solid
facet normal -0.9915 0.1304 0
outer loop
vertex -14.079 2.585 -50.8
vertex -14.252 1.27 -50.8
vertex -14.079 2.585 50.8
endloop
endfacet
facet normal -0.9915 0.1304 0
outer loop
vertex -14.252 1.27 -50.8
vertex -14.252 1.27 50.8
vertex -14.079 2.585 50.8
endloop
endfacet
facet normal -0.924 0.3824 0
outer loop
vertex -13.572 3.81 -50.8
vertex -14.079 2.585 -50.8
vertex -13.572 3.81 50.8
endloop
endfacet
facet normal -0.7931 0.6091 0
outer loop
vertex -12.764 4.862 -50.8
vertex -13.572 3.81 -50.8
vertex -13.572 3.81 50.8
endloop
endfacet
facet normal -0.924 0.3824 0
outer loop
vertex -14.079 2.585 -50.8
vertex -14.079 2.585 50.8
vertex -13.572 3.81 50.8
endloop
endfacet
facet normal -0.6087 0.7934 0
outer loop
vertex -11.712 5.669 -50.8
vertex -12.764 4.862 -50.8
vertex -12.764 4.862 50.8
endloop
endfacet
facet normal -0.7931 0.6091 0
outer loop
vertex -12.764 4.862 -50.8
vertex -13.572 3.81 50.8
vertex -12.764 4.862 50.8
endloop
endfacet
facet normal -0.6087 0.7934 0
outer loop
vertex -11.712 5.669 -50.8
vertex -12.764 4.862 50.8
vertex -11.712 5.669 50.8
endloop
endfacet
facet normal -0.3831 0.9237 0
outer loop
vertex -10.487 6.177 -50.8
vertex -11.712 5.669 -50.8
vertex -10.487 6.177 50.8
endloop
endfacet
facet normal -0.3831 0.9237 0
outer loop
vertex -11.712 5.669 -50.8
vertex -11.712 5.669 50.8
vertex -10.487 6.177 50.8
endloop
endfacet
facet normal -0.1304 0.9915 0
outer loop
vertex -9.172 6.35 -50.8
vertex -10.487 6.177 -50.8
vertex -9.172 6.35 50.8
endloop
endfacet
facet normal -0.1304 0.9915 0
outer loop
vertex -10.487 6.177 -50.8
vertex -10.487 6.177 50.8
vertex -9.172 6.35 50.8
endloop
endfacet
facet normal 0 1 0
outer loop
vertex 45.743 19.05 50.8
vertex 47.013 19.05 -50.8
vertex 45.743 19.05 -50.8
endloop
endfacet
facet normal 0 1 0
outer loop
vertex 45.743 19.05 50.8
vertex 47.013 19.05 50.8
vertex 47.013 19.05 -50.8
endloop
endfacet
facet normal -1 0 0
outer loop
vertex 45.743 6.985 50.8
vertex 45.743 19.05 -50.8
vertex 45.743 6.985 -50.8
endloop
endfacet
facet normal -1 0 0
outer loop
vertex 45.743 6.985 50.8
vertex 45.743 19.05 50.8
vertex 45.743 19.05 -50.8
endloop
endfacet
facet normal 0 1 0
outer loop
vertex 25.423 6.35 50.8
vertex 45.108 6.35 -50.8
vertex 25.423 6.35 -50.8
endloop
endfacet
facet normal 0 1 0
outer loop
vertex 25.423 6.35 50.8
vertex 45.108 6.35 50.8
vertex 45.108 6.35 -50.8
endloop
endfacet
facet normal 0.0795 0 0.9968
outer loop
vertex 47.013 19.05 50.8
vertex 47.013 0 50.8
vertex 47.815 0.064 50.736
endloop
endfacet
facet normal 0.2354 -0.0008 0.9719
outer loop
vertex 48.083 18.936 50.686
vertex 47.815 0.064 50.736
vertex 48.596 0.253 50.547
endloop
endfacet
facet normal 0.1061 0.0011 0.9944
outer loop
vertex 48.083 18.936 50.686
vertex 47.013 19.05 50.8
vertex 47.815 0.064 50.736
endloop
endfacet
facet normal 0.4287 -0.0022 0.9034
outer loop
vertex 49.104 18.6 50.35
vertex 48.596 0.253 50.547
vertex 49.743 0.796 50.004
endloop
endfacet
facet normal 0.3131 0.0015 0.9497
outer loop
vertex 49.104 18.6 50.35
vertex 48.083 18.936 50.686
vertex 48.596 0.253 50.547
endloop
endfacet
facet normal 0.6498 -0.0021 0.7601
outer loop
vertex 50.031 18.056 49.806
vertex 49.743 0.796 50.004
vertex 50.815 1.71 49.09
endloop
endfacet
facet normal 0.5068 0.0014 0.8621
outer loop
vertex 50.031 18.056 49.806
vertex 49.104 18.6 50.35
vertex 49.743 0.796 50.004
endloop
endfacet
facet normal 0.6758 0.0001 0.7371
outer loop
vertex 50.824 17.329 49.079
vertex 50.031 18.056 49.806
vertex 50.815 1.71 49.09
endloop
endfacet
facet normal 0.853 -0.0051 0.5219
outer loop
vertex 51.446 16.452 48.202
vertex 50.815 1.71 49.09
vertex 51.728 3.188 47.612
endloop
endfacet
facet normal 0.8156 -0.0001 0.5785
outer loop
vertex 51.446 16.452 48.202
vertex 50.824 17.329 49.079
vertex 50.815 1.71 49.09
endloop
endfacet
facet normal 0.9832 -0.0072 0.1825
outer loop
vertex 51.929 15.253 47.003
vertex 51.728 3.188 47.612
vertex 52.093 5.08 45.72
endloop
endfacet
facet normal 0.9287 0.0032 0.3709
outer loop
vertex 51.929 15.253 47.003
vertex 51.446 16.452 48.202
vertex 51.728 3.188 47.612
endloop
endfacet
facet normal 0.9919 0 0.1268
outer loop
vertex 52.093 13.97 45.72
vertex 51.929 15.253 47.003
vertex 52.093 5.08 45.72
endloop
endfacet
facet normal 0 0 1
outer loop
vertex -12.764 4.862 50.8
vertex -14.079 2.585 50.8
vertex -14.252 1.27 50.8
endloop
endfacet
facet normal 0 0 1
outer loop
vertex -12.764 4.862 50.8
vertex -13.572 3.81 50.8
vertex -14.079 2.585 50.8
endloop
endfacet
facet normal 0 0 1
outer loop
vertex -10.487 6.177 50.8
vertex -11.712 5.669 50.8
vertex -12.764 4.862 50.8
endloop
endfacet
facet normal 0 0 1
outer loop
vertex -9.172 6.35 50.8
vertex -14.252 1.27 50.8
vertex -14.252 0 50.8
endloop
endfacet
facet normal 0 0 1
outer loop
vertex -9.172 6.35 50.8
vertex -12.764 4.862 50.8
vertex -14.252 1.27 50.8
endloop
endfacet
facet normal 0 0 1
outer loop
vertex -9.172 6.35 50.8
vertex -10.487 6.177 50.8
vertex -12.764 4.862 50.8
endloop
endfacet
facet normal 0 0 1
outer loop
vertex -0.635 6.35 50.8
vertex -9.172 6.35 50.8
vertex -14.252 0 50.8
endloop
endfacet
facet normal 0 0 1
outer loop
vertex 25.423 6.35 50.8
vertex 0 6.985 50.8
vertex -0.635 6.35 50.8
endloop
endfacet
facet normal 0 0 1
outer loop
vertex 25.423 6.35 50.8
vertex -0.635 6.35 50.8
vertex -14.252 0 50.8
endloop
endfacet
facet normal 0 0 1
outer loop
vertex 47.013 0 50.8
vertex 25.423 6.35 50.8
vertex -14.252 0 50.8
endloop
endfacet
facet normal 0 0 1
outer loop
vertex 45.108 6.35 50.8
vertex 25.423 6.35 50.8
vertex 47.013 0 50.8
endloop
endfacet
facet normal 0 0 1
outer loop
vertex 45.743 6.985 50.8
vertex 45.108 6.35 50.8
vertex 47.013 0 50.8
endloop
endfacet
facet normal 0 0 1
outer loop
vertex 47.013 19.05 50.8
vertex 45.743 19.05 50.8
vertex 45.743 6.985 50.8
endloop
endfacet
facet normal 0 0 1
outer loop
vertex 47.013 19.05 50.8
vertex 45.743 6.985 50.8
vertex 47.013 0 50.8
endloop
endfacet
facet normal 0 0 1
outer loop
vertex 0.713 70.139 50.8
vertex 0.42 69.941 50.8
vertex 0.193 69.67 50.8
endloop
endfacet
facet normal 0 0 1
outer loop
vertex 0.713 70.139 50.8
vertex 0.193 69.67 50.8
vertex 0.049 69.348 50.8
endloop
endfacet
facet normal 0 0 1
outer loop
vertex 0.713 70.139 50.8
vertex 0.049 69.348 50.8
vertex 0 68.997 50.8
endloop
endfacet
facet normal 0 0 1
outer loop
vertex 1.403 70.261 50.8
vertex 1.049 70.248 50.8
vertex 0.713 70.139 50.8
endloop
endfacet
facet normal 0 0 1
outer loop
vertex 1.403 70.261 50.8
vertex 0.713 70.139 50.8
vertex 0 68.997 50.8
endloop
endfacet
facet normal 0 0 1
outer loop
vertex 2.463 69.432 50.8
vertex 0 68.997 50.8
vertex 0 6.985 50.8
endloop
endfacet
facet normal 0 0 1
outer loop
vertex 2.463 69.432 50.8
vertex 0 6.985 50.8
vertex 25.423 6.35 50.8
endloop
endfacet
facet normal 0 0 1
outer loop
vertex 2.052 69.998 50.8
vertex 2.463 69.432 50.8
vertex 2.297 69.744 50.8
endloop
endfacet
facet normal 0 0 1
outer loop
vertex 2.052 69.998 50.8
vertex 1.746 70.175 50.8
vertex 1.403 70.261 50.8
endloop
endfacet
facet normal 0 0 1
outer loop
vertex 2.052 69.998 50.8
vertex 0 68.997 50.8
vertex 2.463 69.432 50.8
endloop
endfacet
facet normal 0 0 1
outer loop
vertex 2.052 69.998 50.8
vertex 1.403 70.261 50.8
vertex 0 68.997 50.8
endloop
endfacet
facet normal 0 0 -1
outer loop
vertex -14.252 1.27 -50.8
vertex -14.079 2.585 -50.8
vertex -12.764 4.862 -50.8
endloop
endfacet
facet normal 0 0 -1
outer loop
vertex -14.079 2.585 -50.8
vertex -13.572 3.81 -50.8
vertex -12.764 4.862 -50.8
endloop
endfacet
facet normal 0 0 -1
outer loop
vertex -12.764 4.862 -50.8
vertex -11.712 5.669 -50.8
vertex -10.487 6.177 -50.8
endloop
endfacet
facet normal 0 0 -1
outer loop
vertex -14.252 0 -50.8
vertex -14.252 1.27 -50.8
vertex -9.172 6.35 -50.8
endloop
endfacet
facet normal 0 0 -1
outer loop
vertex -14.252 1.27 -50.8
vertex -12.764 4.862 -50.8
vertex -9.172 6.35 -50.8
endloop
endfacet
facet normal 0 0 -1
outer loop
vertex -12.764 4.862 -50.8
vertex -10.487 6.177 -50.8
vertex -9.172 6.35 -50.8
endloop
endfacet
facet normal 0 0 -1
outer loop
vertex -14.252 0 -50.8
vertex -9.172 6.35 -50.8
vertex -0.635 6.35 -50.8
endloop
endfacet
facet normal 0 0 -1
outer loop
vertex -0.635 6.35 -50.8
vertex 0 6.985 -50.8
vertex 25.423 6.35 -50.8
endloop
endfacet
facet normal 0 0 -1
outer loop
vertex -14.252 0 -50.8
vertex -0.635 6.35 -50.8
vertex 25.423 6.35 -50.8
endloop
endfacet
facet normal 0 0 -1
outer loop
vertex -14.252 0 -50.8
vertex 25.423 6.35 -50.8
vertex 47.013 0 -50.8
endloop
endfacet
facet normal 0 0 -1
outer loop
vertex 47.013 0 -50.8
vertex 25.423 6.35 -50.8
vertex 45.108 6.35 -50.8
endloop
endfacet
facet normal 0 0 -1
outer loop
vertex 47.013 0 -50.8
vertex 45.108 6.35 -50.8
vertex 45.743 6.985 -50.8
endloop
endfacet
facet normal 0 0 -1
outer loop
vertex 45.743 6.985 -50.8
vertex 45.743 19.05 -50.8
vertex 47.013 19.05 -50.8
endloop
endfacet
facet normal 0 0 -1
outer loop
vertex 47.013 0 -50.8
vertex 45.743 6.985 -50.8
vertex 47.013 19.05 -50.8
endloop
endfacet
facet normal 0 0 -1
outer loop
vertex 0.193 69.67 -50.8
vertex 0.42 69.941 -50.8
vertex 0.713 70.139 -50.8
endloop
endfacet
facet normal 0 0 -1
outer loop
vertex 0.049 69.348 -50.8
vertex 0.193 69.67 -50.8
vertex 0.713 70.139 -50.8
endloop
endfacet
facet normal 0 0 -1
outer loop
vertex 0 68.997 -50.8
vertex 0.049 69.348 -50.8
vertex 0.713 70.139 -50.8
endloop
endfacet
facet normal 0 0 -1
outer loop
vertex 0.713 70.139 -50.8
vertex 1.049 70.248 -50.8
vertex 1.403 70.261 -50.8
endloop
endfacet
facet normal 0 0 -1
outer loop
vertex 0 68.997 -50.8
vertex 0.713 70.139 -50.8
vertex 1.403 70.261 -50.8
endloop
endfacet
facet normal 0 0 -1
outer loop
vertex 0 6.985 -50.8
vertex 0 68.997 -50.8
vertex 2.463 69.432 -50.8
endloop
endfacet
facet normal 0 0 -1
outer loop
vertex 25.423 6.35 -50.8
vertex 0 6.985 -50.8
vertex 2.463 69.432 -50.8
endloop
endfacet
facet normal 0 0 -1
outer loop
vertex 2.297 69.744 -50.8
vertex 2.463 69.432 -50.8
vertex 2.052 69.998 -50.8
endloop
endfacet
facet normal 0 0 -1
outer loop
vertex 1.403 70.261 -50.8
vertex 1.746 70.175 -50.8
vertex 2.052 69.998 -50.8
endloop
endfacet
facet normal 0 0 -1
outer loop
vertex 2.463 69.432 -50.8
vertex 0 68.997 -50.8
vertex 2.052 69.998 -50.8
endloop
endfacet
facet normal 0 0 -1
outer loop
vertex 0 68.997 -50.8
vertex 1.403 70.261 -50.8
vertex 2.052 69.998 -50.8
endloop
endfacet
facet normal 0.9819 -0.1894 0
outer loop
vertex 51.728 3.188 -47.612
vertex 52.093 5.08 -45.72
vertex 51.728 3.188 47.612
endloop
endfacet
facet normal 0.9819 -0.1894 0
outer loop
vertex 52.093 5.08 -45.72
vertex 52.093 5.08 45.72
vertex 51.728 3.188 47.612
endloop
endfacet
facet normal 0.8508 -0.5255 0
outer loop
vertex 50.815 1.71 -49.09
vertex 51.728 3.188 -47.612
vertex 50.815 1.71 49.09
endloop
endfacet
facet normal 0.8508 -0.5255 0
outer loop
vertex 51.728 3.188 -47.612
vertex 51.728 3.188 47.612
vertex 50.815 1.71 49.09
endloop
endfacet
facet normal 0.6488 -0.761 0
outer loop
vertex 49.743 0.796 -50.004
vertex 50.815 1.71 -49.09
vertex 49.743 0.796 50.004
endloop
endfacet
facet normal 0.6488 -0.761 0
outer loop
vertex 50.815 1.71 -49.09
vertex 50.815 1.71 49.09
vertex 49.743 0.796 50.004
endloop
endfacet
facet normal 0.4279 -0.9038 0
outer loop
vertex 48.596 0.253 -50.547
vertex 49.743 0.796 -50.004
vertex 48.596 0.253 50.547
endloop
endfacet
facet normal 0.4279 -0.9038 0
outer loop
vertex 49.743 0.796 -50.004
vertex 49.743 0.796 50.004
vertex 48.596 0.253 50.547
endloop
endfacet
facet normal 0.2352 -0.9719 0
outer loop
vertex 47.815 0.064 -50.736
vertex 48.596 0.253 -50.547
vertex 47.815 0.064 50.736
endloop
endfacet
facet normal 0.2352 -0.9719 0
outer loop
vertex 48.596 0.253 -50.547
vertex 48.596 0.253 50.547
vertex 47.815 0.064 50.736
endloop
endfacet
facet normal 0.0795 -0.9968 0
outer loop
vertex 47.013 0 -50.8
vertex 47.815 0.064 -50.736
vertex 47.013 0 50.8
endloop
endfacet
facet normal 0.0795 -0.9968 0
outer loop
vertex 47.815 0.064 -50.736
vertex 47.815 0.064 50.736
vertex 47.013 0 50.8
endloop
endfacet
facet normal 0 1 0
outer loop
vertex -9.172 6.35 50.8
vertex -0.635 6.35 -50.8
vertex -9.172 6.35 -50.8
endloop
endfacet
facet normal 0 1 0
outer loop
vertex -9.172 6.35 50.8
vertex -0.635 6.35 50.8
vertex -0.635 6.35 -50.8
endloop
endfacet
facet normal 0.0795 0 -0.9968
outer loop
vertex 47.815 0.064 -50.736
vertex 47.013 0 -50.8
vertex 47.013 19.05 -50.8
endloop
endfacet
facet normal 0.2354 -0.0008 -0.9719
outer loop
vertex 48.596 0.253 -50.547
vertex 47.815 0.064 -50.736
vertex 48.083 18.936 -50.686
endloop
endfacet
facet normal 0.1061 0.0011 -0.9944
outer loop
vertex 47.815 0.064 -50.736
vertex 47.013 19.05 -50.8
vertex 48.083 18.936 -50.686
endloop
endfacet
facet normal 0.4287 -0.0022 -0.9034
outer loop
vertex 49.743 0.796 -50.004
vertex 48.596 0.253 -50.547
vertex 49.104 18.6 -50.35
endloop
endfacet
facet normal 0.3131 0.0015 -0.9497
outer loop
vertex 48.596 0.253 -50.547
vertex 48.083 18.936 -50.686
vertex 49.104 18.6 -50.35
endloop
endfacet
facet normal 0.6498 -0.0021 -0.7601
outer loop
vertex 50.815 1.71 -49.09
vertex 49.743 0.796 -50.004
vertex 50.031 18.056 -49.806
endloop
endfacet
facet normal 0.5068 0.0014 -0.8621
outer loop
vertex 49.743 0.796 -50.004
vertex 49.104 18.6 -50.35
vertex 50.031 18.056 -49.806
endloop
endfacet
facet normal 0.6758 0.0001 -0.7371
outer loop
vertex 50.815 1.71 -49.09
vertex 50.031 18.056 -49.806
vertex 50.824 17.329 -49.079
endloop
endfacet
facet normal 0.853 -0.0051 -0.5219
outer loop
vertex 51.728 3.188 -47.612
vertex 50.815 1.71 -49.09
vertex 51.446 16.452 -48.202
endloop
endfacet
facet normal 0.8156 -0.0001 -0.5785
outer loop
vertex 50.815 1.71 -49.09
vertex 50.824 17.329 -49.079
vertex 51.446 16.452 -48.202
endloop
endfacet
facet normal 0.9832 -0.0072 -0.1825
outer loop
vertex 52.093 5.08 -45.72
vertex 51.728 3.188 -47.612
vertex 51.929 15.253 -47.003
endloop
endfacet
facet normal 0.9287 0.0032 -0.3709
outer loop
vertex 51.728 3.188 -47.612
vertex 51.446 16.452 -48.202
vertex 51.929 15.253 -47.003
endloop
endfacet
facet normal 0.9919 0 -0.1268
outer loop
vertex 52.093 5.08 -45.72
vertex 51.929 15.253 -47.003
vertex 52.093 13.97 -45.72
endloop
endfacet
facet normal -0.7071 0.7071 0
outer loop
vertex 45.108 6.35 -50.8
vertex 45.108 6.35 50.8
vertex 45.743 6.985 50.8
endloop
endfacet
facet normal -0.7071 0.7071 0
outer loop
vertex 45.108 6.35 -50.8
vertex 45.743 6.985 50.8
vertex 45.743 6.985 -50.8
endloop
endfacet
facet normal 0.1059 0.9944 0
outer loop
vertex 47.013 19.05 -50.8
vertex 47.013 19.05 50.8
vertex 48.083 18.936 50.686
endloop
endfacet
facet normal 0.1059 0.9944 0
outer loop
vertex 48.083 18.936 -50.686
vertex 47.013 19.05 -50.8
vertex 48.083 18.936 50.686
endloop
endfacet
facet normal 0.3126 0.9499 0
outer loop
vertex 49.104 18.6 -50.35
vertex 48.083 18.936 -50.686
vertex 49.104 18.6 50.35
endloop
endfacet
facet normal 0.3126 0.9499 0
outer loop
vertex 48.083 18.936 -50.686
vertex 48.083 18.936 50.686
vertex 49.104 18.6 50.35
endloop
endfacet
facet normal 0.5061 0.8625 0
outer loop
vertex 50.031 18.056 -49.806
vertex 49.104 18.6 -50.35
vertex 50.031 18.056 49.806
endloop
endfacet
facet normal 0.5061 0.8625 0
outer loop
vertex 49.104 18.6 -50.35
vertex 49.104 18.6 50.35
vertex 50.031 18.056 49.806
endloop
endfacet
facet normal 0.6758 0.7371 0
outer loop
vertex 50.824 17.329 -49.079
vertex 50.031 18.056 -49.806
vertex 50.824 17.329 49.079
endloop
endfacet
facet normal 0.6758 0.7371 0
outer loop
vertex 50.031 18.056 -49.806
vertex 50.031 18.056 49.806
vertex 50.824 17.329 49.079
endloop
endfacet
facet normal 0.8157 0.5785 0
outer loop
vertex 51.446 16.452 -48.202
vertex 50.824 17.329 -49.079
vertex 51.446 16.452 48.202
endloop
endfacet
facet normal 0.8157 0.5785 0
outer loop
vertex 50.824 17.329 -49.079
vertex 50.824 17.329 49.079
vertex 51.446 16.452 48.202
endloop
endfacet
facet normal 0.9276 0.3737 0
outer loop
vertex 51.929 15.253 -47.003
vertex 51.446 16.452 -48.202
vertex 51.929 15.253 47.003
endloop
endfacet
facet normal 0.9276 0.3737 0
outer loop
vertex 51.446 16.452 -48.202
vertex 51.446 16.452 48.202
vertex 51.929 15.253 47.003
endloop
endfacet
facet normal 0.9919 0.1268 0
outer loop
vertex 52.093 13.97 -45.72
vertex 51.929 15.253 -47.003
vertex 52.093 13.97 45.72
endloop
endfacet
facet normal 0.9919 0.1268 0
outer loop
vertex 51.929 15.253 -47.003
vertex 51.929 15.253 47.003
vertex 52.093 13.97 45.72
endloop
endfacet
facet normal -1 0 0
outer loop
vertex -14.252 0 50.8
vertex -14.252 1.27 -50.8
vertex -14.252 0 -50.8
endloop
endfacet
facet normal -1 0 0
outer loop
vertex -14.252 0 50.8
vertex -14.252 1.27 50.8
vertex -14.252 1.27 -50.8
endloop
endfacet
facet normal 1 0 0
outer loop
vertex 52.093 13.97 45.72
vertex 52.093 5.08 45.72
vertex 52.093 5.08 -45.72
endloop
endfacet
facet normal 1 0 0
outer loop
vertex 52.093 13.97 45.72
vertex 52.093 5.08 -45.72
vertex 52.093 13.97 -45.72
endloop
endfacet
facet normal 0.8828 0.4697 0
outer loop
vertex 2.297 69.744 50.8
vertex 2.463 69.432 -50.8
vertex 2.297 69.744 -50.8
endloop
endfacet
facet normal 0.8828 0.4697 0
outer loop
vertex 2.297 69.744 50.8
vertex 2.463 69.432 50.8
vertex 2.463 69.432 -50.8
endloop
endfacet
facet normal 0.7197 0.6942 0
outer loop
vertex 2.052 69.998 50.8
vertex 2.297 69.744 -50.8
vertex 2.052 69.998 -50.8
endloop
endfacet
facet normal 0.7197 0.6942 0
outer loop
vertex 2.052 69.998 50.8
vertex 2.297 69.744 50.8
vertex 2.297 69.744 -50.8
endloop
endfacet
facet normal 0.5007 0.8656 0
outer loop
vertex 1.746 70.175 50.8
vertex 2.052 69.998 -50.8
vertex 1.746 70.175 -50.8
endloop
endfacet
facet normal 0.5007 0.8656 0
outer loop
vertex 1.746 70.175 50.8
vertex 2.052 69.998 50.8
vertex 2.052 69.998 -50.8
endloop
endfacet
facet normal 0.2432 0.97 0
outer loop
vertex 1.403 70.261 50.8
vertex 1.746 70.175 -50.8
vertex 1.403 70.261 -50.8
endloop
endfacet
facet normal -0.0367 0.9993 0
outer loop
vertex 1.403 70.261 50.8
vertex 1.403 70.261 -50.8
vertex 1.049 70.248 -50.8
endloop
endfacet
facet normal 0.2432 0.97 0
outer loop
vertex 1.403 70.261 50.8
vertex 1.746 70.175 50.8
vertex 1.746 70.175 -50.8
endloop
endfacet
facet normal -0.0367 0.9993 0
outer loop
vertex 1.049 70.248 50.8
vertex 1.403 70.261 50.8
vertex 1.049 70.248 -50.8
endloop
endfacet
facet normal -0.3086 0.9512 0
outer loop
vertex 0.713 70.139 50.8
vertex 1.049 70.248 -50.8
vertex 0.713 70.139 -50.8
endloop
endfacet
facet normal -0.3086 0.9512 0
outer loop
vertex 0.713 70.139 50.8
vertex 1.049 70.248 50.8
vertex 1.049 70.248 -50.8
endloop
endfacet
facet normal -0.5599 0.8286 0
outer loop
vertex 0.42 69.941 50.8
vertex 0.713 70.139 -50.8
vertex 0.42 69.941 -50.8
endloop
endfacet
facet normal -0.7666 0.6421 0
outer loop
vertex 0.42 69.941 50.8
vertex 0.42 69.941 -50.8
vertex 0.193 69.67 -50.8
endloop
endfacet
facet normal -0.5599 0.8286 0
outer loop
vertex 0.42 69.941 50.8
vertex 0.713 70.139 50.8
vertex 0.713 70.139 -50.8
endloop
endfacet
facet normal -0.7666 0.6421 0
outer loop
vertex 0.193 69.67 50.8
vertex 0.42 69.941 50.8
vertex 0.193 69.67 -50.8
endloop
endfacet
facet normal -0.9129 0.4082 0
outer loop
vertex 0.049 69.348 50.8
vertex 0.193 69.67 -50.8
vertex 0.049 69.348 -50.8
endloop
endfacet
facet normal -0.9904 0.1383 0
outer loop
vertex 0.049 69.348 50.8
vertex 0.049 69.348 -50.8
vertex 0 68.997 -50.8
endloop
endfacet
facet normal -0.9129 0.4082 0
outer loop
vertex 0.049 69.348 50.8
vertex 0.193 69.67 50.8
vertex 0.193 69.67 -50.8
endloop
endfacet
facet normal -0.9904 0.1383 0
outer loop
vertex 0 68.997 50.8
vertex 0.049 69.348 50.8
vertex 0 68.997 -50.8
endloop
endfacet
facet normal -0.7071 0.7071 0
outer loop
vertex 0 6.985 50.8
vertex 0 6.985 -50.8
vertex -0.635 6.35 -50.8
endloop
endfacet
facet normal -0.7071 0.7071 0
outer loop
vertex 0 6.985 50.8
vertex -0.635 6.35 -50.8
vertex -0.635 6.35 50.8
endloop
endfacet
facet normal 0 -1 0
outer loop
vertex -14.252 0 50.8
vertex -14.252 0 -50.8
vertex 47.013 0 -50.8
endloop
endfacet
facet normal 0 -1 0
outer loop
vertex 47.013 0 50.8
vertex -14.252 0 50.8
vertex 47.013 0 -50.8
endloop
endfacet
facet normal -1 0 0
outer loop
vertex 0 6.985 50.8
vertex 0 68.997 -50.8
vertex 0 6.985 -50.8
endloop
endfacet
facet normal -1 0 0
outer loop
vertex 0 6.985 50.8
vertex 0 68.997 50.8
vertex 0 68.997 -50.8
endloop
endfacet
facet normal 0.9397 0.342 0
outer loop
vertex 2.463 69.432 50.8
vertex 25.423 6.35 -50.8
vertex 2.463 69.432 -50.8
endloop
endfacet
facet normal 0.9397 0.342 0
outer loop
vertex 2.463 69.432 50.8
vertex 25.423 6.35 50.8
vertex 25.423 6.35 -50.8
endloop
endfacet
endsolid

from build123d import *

# Parameters (mm, degrees)
F1_DEPTH = 50.8
F2_R     = 1.27
F3_R     = 5.08
F4_SIZE  = 0.635
F5_R     = 5.08


with BuildPart() as f1:
    # F0 (on Top) → F1 (new body, symmetric)
    with BuildSketch(Plane.XY):
        Polygon((25.423321, 6.35), (0, 76.2), (0, 6.35), (-14.25222, 6.35), (-14.25222, 0), (0, 0), (52.093321, 0), (52.093321, 19.05), (45.743321, 19.05), (45.743321, 6.35), align=None)
    extrude(amount=F1_DEPTH, both=True)

    # F2
    f2_edges = [f1.edges().sort_by_distance(p)[0] for p in [
        (0, 76.2, 0),
    ]]
    fillet(f2_edges, radius=F2_R)

    # F3
    f3_edges = [f1.edges().sort_by_distance(p)[0] for p in [
        (52.093321, 0, 0),
        (52.093321, 9.525, -50.8),
        (52.093321, 19.05, 0),
        (52.093321, 9.525, 50.8),
    ]]
    fillet(f3_edges, radius=F3_R)

    # F4
    f4_edges = [f1.edges().sort_by_distance(p)[0] for p in [
        (45.743321, 6.35, 0),
        (0, 6.35, 0),
    ]]
    chamfer(f4_edges, length=F4_SIZE)

    # F5
    f5_edges = [f1.edges().sort_by_distance(p)[0] for p in [
        (-14.25222, 6.35, 0),
    ]]
    fillet(f5_edges, radius=F5_R)


solid = f1.part
